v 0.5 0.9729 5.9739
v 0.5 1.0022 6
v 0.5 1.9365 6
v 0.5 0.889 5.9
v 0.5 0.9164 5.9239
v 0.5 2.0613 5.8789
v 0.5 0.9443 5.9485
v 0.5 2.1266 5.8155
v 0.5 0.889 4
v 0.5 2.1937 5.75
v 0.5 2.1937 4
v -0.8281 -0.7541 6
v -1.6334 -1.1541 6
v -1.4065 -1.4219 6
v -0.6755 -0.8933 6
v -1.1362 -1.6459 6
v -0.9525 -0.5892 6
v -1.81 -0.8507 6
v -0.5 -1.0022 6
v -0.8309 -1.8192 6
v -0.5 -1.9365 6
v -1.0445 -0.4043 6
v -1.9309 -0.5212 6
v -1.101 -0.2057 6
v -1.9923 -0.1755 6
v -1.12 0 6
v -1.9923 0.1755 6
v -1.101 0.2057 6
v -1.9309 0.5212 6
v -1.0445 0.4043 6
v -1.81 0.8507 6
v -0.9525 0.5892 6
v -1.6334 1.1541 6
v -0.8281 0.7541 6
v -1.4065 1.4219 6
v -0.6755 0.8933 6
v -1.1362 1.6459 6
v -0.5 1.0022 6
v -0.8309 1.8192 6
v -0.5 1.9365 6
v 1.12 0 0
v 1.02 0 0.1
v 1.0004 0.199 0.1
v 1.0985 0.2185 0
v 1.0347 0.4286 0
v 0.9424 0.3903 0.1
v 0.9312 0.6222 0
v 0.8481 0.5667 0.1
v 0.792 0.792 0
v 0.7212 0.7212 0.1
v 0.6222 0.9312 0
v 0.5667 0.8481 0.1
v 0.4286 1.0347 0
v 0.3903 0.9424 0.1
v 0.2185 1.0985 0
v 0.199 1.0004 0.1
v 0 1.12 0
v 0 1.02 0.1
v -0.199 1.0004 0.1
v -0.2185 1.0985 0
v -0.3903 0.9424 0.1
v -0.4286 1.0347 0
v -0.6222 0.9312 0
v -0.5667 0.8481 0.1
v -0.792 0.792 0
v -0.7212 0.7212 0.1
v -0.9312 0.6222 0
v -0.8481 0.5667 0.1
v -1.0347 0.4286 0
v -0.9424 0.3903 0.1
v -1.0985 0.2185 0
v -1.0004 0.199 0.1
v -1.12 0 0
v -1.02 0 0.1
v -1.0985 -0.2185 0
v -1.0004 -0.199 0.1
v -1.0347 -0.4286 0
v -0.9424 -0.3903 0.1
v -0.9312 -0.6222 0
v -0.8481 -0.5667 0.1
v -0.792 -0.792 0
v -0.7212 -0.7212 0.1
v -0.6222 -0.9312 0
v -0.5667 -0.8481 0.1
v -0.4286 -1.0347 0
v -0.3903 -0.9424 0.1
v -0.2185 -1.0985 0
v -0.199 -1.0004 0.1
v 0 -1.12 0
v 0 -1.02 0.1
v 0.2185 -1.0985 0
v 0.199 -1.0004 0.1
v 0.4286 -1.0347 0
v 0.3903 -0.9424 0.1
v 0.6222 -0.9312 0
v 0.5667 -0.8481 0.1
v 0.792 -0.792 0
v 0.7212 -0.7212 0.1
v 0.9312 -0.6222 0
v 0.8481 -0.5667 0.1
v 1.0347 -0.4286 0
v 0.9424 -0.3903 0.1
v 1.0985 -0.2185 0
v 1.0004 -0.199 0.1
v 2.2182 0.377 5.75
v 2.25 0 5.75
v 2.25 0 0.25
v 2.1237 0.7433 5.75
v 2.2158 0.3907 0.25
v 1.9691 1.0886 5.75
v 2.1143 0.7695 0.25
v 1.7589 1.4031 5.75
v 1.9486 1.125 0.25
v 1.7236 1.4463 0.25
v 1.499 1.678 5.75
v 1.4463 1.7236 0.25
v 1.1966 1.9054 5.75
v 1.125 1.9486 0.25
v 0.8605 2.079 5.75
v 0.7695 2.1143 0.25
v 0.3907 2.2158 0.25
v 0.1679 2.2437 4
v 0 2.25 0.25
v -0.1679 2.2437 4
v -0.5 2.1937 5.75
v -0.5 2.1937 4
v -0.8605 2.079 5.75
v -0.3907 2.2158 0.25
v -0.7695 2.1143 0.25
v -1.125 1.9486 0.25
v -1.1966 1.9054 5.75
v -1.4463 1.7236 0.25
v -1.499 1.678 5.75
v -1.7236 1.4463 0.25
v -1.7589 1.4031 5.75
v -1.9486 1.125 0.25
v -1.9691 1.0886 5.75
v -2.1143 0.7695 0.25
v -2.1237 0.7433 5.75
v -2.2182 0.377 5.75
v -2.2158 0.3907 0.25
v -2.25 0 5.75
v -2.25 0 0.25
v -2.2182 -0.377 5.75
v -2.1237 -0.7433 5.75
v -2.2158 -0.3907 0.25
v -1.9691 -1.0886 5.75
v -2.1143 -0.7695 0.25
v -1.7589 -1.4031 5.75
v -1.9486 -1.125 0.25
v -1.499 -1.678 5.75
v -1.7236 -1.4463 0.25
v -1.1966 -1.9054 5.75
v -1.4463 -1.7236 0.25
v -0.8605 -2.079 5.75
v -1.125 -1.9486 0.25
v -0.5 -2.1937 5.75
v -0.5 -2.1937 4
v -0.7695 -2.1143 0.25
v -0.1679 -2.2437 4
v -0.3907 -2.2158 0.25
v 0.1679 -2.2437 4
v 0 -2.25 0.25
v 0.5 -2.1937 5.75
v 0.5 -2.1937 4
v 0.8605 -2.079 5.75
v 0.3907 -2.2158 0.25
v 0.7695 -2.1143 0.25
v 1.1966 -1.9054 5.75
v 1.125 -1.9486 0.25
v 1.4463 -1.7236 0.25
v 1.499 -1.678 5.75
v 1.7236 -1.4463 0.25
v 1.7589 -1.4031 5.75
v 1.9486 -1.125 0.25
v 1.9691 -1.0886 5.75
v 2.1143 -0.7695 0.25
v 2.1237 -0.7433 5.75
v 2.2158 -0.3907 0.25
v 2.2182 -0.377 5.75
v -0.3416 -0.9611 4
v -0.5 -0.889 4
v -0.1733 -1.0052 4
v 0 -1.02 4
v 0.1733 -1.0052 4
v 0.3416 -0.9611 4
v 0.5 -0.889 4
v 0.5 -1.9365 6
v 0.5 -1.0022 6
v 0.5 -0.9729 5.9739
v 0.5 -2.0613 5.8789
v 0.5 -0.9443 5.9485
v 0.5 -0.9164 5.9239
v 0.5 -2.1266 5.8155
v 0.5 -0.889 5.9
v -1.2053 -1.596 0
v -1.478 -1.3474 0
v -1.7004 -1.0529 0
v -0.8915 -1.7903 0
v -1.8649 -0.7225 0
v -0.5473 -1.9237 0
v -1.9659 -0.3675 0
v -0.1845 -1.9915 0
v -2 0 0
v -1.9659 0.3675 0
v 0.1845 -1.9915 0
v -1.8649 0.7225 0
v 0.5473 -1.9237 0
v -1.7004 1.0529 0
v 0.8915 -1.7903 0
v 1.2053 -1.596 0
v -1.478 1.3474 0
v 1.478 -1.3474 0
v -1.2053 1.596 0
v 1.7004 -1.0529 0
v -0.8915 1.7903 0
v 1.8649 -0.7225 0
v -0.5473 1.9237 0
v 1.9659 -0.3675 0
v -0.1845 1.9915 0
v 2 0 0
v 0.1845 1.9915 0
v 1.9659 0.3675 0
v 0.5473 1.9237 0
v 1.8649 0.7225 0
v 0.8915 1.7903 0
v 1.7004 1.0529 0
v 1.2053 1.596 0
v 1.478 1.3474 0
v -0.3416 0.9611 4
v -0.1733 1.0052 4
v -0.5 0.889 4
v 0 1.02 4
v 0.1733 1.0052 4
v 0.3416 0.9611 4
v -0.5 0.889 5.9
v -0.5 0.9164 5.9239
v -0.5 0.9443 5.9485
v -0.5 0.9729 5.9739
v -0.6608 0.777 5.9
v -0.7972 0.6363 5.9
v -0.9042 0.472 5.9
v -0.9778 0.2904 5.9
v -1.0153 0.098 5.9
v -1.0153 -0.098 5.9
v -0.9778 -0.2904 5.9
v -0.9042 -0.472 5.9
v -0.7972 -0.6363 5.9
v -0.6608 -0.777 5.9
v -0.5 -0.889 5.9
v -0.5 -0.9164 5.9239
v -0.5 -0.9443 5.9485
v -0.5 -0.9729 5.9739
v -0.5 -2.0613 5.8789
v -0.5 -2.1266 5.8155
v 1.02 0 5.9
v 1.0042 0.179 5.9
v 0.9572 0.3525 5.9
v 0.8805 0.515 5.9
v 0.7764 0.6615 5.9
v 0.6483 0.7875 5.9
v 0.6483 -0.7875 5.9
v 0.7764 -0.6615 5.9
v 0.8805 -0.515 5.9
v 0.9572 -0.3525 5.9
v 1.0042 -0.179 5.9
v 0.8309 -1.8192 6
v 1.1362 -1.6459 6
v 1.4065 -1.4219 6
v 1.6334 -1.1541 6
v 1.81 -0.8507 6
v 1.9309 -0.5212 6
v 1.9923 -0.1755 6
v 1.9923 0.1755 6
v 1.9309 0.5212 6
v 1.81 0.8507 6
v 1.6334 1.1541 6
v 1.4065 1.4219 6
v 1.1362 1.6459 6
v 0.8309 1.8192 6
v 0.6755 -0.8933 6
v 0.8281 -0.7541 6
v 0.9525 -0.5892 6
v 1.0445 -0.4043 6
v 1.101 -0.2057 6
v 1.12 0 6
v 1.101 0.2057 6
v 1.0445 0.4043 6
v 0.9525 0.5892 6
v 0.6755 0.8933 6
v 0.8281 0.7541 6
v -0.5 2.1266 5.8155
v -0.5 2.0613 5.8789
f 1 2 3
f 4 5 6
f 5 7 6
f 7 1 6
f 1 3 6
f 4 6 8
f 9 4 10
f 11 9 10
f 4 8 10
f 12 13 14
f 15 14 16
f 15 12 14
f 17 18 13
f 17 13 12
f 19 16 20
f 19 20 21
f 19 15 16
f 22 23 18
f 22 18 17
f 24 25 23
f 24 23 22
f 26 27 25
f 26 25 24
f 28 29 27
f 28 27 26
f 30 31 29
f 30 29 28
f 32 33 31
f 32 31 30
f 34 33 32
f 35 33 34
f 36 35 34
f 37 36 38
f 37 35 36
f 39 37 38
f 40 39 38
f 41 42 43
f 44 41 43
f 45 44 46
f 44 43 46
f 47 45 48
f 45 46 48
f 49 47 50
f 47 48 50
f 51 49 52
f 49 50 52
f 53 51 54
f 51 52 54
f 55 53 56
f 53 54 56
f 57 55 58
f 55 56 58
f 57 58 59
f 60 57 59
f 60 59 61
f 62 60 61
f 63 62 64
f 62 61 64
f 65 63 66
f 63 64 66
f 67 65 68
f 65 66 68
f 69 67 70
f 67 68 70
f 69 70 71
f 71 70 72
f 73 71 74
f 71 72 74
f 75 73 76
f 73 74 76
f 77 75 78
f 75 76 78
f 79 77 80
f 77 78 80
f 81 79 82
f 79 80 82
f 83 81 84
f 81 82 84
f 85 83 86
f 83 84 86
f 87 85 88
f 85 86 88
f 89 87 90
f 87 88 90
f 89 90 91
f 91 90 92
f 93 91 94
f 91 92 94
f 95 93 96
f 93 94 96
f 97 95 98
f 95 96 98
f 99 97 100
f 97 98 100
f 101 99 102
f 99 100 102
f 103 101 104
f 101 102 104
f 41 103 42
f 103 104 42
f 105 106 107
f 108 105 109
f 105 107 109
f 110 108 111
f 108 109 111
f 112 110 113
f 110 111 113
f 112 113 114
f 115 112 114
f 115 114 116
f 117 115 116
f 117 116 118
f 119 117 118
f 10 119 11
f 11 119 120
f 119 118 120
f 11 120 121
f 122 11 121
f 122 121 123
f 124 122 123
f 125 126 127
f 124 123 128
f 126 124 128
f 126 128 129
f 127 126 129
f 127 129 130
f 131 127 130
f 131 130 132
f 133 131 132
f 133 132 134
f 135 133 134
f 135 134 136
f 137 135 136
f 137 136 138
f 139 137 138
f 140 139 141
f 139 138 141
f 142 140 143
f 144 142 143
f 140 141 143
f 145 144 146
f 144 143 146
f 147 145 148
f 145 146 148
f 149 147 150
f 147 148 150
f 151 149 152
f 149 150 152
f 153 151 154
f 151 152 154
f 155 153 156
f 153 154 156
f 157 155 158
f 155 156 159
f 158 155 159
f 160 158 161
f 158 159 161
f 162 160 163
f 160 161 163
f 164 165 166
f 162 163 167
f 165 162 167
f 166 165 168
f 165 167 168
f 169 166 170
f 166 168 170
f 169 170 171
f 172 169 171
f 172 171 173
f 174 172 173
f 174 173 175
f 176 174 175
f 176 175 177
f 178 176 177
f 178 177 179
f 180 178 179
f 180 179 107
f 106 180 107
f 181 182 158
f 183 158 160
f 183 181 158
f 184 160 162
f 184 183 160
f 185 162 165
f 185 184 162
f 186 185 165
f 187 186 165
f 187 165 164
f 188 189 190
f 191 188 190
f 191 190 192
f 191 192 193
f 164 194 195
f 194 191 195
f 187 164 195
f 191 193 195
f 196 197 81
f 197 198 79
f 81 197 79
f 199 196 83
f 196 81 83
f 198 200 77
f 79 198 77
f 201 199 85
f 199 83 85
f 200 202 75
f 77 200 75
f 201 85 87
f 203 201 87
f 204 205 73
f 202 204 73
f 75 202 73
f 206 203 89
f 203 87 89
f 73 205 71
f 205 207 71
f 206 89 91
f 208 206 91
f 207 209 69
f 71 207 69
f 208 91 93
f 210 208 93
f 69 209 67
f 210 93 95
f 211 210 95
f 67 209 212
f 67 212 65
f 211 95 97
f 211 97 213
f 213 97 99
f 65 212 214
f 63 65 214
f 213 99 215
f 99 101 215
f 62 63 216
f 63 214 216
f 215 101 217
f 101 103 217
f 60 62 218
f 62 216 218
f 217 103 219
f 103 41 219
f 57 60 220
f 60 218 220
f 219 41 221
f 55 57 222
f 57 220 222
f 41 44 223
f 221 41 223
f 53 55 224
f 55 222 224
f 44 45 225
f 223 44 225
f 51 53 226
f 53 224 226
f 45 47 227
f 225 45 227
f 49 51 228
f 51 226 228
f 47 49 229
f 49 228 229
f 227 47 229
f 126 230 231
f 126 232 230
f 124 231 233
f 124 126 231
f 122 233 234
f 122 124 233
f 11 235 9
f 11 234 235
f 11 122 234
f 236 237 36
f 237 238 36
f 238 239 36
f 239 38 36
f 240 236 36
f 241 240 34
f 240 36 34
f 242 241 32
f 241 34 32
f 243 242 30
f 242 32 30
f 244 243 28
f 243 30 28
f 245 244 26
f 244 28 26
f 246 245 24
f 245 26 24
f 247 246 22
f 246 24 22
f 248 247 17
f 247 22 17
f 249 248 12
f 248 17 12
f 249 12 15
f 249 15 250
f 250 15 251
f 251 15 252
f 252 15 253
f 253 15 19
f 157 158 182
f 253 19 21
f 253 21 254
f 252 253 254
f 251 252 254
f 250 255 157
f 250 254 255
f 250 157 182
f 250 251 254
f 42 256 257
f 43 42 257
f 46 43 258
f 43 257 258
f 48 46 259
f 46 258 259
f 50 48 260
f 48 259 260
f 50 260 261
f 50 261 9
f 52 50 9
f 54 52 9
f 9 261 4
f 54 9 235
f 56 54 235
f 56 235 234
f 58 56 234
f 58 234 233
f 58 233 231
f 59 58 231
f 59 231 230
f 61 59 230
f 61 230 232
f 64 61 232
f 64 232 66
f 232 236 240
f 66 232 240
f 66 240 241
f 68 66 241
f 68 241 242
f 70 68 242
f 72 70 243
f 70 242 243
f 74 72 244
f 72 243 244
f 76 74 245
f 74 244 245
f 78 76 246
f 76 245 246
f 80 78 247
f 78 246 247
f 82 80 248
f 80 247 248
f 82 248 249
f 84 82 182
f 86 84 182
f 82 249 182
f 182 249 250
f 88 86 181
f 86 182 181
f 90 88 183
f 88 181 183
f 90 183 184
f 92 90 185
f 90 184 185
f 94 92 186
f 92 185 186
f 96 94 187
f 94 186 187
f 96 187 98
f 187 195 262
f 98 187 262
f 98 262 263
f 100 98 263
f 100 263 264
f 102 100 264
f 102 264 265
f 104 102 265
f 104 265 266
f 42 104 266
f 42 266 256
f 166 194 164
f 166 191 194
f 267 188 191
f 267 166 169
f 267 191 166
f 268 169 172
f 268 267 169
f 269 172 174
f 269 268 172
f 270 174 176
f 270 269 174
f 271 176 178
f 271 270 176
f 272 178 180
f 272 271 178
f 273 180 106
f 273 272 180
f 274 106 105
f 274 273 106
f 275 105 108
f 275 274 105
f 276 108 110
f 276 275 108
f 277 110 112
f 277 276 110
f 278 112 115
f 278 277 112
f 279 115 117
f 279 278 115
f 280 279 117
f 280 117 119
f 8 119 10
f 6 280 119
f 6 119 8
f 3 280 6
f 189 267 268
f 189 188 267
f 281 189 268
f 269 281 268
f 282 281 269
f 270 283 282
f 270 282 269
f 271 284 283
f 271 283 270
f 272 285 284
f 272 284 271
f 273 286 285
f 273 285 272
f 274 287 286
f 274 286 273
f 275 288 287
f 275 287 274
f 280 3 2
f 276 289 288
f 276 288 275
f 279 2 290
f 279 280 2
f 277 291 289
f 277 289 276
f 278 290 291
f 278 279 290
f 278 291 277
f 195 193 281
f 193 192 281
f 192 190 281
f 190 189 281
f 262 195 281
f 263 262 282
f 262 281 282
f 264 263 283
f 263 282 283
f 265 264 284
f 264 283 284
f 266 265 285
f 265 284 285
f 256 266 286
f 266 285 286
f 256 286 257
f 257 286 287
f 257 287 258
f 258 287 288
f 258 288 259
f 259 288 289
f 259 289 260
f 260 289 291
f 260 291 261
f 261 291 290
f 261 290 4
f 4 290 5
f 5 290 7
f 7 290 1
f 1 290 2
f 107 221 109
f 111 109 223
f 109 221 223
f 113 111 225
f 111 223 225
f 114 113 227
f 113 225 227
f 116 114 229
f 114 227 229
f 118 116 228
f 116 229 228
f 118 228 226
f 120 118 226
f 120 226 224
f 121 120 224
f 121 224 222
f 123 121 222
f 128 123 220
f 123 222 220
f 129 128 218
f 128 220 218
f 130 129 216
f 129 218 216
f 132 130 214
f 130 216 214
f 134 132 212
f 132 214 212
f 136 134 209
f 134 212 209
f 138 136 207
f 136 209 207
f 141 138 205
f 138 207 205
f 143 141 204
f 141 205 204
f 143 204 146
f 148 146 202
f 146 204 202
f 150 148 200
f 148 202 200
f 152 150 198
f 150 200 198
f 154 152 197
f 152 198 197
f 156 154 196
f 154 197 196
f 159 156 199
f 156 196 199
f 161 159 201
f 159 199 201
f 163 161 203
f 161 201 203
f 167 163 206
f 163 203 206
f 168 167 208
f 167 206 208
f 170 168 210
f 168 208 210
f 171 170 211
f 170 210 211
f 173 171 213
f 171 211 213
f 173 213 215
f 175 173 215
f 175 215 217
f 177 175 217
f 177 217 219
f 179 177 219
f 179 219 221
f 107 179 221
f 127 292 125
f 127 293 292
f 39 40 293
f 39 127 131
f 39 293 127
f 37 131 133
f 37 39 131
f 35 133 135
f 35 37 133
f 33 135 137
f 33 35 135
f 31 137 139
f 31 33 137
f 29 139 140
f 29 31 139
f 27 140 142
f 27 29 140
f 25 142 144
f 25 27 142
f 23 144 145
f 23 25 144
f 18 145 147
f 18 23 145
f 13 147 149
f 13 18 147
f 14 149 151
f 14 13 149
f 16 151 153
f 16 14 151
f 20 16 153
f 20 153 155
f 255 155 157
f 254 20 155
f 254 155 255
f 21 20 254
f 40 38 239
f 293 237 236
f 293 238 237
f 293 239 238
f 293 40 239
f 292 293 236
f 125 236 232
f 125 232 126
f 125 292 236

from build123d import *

# Parameters (mm, degrees)
SKETCH_1_R          = 2.25
EXTRUDE_1_DEPTH     = 6
SKETCH_2_R          = 1.02
CUT_EXTRUDE_1_DEPTH = 6
SKETCH_3_W          = 1
SKETCH_3_H          = 5
CUT_EXTRUDE_2_DEPTH = 2
CHAMFER_1_SIZE      = 0.25
CHAMFER_2_SIZE      = 0.25
CHAMFER_4_SIZE      = 0.25
CHAMFER_5_SIZE      = 0.1
CHAMFER_6_SIZE      = 0.1
CHAMFER_7_SIZE      = 0.1


with BuildPart() as part:
    # Эскиз1 → Бобышка-Вытянуть1 (new body)
    with BuildSketch(Plane.XY):
        Circle(SKETCH_1_R)
    extrude(amount=EXTRUDE_1_DEPTH)

    # Эскиз2 → Вырез-Вытянуть1 (cut)
    with BuildSketch(Plane.XY.offset(6)):
        Circle(SKETCH_2_R)
    extrude(amount=-CUT_EXTRUDE_1_DEPTH, mode=Mode.SUBTRACT)

    # Эскиз3 → Вырез-Вытянуть2 (cut)
    with BuildSketch(Plane.XY.offset(6)):
        Rectangle(SKETCH_3_W, SKETCH_3_H)
    extrude(amount=-CUT_EXTRUDE_2_DEPTH, mode=Mode.SUBTRACT)

    # Фаска1
    chamfer_1_edges = [part.edges().sort_by_distance(p)[0] for p in [
        (1.75890591, -1.40312152, 6),
    ]]
    chamfer(chamfer_1_edges, length=CHAMFER_1_SIZE)

    # Фаска2
    chamfer_2_edges = [part.edges().sort_by_distance(p)[0] for p in [
        (-2.25, 0, 6),
    ]]
    chamfer(chamfer_2_edges, length=CHAMFER_2_SIZE)

    # Фаска4
    chamfer_4_edges = [part.edges().sort_by_distance(p)[0] for p in [
        (-2.25, 0, 0),
    ]]
    chamfer(chamfer_4_edges, length=CHAMFER_4_SIZE)

    # Фаска5
    chamfer_5_edges = [part.edges().sort_by_distance(p)[0] for p in [
        (-1.02, 0, 0),
    ]]
    chamfer(chamfer_5_edges, length=CHAMFER_5_SIZE)

    # Фаска6
    chamfer_6_edges = [part.edges().sort_by_distance(p)[0] for p in [
        (0.880454428, -0.514975728, 6),
    ]]
    chamfer(chamfer_6_edges, length=CHAMFER_6_SIZE)

    # Фаска7
    chamfer_7_edges = [part.edges().sort_by_distance(p)[0] for p in [
        (-1.02, 0, 6),
    ]]
    chamfer(chamfer_7_edges, length=CHAMFER_7_SIZE)


solid = part.part
